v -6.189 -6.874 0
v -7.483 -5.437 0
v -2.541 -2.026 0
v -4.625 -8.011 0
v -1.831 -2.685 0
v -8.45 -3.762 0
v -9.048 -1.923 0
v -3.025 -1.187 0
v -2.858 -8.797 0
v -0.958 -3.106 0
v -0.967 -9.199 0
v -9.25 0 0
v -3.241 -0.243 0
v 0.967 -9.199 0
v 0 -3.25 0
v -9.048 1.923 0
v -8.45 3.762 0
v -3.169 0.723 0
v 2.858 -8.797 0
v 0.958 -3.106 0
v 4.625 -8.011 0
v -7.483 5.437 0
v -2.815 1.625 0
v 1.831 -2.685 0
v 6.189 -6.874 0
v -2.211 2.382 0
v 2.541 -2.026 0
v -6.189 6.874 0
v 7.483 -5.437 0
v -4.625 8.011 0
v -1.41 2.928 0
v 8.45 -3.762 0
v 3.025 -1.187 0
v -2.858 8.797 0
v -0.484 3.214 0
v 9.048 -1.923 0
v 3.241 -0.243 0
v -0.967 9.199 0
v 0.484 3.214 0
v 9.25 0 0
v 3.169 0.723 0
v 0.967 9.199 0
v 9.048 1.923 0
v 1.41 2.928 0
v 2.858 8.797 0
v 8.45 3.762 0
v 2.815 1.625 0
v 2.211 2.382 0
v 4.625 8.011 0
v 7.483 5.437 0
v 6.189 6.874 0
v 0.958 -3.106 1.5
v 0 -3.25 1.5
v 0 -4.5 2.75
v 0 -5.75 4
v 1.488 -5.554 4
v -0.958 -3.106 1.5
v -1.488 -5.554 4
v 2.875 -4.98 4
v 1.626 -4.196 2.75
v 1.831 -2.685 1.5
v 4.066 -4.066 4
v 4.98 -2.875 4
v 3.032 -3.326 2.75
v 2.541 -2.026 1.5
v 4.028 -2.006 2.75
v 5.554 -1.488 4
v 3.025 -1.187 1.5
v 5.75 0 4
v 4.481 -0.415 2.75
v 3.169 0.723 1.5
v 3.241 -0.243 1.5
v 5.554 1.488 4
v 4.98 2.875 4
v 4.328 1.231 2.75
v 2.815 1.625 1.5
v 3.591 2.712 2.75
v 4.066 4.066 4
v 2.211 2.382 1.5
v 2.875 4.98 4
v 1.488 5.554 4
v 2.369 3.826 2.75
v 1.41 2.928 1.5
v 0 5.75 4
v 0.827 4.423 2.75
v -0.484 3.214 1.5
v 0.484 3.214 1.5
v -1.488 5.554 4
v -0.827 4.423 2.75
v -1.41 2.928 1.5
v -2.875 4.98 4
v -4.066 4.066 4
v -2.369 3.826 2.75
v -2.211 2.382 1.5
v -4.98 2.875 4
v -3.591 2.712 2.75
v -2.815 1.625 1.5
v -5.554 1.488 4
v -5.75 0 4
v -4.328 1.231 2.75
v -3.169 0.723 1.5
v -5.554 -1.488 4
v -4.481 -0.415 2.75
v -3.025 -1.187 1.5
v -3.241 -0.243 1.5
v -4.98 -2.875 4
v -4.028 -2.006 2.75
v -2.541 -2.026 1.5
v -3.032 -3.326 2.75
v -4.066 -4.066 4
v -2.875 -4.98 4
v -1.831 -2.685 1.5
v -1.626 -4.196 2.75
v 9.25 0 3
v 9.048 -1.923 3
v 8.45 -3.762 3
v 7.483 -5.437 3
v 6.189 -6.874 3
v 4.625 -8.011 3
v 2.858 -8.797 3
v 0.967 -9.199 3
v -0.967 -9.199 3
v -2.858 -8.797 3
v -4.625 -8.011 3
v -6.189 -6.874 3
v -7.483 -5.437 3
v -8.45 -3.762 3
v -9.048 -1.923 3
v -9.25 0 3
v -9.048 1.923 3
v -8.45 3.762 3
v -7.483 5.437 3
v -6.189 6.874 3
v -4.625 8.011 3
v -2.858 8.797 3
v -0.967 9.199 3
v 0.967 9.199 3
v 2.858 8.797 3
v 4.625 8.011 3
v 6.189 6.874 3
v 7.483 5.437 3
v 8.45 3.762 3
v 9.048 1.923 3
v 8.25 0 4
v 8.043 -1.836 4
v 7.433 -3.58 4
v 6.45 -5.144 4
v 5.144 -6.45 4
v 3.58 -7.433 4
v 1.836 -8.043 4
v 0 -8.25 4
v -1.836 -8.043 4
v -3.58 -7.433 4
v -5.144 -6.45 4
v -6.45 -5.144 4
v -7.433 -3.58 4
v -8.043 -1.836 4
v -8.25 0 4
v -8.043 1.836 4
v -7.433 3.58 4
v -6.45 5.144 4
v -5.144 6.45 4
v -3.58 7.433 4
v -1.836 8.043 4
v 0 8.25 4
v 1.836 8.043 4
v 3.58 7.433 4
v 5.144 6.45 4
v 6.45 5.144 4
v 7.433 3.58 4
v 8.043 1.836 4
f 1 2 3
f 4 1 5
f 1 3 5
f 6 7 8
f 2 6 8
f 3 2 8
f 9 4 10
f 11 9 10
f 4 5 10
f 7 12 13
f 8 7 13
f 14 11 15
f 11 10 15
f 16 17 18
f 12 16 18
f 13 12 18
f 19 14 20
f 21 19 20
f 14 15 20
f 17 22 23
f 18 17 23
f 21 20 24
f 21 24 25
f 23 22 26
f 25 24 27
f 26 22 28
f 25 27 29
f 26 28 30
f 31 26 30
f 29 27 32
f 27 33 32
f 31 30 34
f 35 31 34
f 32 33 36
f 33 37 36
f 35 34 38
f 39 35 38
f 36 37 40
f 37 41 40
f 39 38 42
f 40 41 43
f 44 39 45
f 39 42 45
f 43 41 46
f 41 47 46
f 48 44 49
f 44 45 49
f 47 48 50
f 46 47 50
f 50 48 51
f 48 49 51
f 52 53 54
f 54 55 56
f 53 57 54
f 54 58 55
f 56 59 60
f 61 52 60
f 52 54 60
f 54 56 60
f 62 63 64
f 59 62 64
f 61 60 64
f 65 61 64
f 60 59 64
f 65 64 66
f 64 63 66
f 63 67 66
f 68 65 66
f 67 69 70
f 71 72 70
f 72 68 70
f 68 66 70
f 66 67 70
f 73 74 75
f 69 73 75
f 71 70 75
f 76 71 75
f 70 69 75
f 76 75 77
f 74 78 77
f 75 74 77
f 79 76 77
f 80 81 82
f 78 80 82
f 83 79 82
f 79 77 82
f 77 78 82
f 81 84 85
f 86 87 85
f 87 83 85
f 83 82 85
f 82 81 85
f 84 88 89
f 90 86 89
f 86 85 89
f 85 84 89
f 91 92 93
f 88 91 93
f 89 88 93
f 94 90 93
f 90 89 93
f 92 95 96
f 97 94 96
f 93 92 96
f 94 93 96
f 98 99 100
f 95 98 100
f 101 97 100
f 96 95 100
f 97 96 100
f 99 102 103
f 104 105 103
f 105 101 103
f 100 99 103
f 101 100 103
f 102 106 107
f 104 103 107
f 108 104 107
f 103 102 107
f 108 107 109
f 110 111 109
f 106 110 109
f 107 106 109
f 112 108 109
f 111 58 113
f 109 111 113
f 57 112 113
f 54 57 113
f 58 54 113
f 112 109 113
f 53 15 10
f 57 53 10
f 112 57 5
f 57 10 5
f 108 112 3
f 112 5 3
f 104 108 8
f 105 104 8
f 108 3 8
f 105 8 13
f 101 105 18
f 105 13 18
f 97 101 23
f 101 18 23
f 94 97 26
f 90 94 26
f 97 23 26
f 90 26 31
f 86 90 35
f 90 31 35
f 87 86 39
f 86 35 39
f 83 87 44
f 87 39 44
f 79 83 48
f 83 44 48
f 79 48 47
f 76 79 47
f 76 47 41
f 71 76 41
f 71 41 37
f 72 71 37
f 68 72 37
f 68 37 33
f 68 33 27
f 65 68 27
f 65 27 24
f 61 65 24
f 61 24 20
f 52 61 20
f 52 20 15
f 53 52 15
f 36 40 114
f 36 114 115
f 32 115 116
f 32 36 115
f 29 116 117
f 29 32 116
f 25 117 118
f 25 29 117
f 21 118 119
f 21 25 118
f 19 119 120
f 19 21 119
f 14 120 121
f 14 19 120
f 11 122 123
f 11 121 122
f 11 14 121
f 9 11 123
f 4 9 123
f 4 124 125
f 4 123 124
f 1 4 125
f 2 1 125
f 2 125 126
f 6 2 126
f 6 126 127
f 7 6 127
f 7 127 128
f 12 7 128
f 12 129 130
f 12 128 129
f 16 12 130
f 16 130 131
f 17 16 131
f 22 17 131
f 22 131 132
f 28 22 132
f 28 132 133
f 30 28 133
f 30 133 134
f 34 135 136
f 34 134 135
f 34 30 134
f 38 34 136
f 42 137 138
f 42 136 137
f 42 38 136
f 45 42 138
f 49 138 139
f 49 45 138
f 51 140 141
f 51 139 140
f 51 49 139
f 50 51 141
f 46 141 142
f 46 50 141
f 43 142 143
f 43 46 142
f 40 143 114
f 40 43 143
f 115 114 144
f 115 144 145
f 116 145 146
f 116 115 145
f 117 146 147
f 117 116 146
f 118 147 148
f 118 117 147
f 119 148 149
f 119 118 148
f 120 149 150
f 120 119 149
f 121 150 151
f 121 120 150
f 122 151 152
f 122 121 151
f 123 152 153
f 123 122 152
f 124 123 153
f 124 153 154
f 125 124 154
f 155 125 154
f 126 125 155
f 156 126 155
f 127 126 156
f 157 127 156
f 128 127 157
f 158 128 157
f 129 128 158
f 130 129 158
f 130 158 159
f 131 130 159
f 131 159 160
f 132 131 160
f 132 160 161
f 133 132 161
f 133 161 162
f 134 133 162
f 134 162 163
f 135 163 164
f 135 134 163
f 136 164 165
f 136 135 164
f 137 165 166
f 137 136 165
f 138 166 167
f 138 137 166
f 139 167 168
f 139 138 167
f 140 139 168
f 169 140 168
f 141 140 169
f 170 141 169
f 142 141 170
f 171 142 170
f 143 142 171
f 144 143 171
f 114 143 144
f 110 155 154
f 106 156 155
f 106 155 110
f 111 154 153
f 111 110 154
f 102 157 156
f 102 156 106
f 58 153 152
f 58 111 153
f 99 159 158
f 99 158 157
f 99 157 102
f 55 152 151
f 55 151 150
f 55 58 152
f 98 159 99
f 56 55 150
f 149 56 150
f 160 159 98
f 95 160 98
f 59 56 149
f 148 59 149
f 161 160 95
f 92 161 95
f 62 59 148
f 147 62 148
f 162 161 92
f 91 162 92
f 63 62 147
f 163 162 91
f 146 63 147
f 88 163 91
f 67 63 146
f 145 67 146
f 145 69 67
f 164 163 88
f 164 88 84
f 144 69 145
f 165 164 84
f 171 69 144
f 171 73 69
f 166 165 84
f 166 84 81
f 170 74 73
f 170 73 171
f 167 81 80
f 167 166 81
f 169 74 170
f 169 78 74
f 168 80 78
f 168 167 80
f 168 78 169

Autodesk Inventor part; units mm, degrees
ref_plane "YZ Plane" through (0, 0, 0) normal (1, 0, 0) x (0, 1, 0)
ref_plane "XZ Plane" through (0, 0, 0) normal (0, 1, 0) x (-1, 0, 0)
ref_plane "XY Plane" through (0, 0, 0) normal (0, 0, 1) x (1, 0, 0)
sketch "Sketch1" plane through (0, 0, 0) normal (0, 0, 1) x (1, 0, 0)
  circle A0 centre (0, 0) radius 9.25
  dimension "d0" = 18.5
extrude "Extrusion1" add sketch "Sketch1" along normal blind 4
sketch "Sketch2" plane through (0, 0, 4) normal (0, 0, 1) x (1, 0, 0)
  circle A0 centre (0, 0) radius 9.25 projected
hole "Hole1" at (0, 0, 4) direction (0, 0, -1) diameter 6.5 depth 4 tip angle 118 countersink diameter 11.5 countersink angle 90
chamfer "Chamfer1" distance 1 angle 45 1 edges at (-9.25, 0, 4)
properties part number "ARRUELA ESPECIAL DAS RODAS(31)" material "Carbon Steel"
